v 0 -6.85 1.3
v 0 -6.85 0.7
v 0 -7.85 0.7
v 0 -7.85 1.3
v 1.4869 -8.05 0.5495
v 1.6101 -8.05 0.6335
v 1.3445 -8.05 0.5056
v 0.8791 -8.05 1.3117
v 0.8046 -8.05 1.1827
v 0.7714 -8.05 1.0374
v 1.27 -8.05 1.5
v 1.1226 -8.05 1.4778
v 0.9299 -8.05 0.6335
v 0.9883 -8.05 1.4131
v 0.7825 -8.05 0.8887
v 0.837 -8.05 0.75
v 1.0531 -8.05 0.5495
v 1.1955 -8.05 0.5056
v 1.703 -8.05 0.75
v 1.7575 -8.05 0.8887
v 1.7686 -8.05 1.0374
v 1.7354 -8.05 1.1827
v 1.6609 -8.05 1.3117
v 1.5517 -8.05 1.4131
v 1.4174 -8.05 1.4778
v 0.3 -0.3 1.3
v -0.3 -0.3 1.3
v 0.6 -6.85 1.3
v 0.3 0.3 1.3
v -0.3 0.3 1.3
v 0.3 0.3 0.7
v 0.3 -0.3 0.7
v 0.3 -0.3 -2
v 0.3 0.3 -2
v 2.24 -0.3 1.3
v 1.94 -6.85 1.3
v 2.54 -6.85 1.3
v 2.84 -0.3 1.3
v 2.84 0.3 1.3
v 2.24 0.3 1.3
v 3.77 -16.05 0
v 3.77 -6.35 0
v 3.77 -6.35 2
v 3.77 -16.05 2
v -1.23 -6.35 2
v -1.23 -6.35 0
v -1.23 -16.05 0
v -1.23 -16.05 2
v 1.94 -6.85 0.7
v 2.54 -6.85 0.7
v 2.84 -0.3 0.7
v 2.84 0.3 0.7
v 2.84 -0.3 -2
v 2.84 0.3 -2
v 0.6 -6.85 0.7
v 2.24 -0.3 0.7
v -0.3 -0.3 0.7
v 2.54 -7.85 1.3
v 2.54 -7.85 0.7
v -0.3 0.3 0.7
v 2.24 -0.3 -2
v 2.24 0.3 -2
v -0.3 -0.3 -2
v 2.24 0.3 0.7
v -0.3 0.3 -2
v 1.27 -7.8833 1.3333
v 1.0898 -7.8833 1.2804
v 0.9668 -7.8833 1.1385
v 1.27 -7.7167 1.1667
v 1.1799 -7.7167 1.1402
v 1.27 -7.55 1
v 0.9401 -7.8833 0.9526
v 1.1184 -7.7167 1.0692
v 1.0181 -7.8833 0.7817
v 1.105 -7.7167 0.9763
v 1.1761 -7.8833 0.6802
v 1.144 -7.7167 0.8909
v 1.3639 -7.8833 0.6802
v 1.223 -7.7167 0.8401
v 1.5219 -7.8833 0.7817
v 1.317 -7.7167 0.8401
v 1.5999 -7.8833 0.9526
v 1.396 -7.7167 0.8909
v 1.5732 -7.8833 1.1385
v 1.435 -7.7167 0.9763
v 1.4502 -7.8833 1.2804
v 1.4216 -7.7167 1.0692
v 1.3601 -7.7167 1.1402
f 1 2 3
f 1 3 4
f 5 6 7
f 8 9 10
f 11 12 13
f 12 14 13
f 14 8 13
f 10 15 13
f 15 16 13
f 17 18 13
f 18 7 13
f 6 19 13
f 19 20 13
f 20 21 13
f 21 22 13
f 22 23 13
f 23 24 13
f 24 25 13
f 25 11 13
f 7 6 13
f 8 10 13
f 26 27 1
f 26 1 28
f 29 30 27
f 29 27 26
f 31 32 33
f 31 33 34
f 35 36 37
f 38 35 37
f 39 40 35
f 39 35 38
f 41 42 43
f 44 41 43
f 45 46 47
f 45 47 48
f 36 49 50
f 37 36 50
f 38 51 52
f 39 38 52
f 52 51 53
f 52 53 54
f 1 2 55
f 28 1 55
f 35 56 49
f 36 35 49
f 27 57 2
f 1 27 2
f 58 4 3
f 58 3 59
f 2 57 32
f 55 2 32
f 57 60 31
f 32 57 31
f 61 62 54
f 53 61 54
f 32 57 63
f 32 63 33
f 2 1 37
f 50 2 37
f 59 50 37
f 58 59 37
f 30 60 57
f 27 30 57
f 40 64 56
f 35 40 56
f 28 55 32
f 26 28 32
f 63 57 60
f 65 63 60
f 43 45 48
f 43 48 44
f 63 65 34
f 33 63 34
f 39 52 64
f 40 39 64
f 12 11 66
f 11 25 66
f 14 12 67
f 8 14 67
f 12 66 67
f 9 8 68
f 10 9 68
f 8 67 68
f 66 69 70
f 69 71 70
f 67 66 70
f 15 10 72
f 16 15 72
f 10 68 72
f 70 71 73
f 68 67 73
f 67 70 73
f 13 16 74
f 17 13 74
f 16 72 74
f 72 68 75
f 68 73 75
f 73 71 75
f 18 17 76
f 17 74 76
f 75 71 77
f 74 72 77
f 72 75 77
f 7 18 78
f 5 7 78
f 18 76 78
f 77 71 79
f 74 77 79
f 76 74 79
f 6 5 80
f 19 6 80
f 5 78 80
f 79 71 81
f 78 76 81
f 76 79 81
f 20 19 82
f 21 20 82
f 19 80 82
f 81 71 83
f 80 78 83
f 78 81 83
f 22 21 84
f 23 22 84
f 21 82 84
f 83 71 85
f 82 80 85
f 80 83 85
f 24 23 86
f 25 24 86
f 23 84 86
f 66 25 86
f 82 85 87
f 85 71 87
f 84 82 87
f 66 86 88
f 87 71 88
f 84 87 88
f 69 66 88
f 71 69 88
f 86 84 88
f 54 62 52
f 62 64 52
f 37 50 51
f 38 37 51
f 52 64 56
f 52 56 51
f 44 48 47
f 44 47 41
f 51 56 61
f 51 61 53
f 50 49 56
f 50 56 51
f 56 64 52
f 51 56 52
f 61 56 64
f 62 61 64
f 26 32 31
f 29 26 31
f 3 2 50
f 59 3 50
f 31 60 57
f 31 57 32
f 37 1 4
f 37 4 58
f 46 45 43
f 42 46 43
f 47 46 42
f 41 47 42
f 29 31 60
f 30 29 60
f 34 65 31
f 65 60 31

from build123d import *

# Parameters (mm, degrees)
SKETCH_W       = 0.6
SKETCH_H       = 0.6
PAD_DEPTH      = 0.7
PAD_DEPTH_BACK = 2
PAD001_DEPTH   = 0.6
SKETCH002_W    = 2.54
SKETCH002_H    = 0.6
PAD002_DEPTH   = 1
SKETCH004_W    = 5
SKETCH004_H    = 2
PAD003_DEPTH   = 9.7


with BuildPart() as pad:
    # Sketch → Pad (new body, two sides)
    with BuildSketch(Plane.XY) as pad_sk:
        Rectangle(SKETCH_W, SKETCH_H)
        with Locations((2.54, 0)):
            Rectangle(SKETCH_W, SKETCH_H)
    extrude(amount=PAD_DEPTH)
    extrude(pad_sk.sketch, amount=-PAD_DEPTH_BACK)


with BuildPart() as pad001:
    # Sketch001 → Pad001 (new body)
    with BuildSketch(Plane.XY.offset(0.7)):
        Polygon((0.3, 0.3), (-0.3, 0.3), (-0.3, -0.3), (0, -6.85), (0.6, -6.85), (0.3, -0.3), align=None)
        Polygon((2.84, 0.3), (2.24, 0.3), (2.24, -0.3), (1.94, -6.85), (2.54, -6.85), (2.84, -0.3), align=None)
    extrude(amount=PAD001_DEPTH)


with BuildPart() as pad002:
    # Sketch002 → Pad002 (new body)
    with BuildSketch(Plane.XZ.offset(6.85)):
        with Locations((1.27, 1)):
            Rectangle(SKETCH002_W, SKETCH002_H)
    extrude(amount=PAD002_DEPTH)


with BuildPart() as pad003:
    # Sketch004 → Pad003 (new body)
    with BuildSketch(Plane.XZ.offset(6.35)):
        with Locations((1.27, 1)):
            Rectangle(SKETCH004_W, SKETCH004_H)
    extrude(amount=PAD003_DEPTH)


with BuildPart() as revolution001:
    # Sketch005 → Revolution001 (revolve)
    with BuildSketch(Plane.YZ.offset(1.27)):
        Polygon((-7.55, 1), (-8.05, 1), (-8.05, 1.5), align=None)
    revolve(axis=Axis((1.27, -3.977201, 1), (0, -1, 0)))


solid = Compound([pad.part, pad001.part, pad002.part, pad003.part, revolution001.part])
